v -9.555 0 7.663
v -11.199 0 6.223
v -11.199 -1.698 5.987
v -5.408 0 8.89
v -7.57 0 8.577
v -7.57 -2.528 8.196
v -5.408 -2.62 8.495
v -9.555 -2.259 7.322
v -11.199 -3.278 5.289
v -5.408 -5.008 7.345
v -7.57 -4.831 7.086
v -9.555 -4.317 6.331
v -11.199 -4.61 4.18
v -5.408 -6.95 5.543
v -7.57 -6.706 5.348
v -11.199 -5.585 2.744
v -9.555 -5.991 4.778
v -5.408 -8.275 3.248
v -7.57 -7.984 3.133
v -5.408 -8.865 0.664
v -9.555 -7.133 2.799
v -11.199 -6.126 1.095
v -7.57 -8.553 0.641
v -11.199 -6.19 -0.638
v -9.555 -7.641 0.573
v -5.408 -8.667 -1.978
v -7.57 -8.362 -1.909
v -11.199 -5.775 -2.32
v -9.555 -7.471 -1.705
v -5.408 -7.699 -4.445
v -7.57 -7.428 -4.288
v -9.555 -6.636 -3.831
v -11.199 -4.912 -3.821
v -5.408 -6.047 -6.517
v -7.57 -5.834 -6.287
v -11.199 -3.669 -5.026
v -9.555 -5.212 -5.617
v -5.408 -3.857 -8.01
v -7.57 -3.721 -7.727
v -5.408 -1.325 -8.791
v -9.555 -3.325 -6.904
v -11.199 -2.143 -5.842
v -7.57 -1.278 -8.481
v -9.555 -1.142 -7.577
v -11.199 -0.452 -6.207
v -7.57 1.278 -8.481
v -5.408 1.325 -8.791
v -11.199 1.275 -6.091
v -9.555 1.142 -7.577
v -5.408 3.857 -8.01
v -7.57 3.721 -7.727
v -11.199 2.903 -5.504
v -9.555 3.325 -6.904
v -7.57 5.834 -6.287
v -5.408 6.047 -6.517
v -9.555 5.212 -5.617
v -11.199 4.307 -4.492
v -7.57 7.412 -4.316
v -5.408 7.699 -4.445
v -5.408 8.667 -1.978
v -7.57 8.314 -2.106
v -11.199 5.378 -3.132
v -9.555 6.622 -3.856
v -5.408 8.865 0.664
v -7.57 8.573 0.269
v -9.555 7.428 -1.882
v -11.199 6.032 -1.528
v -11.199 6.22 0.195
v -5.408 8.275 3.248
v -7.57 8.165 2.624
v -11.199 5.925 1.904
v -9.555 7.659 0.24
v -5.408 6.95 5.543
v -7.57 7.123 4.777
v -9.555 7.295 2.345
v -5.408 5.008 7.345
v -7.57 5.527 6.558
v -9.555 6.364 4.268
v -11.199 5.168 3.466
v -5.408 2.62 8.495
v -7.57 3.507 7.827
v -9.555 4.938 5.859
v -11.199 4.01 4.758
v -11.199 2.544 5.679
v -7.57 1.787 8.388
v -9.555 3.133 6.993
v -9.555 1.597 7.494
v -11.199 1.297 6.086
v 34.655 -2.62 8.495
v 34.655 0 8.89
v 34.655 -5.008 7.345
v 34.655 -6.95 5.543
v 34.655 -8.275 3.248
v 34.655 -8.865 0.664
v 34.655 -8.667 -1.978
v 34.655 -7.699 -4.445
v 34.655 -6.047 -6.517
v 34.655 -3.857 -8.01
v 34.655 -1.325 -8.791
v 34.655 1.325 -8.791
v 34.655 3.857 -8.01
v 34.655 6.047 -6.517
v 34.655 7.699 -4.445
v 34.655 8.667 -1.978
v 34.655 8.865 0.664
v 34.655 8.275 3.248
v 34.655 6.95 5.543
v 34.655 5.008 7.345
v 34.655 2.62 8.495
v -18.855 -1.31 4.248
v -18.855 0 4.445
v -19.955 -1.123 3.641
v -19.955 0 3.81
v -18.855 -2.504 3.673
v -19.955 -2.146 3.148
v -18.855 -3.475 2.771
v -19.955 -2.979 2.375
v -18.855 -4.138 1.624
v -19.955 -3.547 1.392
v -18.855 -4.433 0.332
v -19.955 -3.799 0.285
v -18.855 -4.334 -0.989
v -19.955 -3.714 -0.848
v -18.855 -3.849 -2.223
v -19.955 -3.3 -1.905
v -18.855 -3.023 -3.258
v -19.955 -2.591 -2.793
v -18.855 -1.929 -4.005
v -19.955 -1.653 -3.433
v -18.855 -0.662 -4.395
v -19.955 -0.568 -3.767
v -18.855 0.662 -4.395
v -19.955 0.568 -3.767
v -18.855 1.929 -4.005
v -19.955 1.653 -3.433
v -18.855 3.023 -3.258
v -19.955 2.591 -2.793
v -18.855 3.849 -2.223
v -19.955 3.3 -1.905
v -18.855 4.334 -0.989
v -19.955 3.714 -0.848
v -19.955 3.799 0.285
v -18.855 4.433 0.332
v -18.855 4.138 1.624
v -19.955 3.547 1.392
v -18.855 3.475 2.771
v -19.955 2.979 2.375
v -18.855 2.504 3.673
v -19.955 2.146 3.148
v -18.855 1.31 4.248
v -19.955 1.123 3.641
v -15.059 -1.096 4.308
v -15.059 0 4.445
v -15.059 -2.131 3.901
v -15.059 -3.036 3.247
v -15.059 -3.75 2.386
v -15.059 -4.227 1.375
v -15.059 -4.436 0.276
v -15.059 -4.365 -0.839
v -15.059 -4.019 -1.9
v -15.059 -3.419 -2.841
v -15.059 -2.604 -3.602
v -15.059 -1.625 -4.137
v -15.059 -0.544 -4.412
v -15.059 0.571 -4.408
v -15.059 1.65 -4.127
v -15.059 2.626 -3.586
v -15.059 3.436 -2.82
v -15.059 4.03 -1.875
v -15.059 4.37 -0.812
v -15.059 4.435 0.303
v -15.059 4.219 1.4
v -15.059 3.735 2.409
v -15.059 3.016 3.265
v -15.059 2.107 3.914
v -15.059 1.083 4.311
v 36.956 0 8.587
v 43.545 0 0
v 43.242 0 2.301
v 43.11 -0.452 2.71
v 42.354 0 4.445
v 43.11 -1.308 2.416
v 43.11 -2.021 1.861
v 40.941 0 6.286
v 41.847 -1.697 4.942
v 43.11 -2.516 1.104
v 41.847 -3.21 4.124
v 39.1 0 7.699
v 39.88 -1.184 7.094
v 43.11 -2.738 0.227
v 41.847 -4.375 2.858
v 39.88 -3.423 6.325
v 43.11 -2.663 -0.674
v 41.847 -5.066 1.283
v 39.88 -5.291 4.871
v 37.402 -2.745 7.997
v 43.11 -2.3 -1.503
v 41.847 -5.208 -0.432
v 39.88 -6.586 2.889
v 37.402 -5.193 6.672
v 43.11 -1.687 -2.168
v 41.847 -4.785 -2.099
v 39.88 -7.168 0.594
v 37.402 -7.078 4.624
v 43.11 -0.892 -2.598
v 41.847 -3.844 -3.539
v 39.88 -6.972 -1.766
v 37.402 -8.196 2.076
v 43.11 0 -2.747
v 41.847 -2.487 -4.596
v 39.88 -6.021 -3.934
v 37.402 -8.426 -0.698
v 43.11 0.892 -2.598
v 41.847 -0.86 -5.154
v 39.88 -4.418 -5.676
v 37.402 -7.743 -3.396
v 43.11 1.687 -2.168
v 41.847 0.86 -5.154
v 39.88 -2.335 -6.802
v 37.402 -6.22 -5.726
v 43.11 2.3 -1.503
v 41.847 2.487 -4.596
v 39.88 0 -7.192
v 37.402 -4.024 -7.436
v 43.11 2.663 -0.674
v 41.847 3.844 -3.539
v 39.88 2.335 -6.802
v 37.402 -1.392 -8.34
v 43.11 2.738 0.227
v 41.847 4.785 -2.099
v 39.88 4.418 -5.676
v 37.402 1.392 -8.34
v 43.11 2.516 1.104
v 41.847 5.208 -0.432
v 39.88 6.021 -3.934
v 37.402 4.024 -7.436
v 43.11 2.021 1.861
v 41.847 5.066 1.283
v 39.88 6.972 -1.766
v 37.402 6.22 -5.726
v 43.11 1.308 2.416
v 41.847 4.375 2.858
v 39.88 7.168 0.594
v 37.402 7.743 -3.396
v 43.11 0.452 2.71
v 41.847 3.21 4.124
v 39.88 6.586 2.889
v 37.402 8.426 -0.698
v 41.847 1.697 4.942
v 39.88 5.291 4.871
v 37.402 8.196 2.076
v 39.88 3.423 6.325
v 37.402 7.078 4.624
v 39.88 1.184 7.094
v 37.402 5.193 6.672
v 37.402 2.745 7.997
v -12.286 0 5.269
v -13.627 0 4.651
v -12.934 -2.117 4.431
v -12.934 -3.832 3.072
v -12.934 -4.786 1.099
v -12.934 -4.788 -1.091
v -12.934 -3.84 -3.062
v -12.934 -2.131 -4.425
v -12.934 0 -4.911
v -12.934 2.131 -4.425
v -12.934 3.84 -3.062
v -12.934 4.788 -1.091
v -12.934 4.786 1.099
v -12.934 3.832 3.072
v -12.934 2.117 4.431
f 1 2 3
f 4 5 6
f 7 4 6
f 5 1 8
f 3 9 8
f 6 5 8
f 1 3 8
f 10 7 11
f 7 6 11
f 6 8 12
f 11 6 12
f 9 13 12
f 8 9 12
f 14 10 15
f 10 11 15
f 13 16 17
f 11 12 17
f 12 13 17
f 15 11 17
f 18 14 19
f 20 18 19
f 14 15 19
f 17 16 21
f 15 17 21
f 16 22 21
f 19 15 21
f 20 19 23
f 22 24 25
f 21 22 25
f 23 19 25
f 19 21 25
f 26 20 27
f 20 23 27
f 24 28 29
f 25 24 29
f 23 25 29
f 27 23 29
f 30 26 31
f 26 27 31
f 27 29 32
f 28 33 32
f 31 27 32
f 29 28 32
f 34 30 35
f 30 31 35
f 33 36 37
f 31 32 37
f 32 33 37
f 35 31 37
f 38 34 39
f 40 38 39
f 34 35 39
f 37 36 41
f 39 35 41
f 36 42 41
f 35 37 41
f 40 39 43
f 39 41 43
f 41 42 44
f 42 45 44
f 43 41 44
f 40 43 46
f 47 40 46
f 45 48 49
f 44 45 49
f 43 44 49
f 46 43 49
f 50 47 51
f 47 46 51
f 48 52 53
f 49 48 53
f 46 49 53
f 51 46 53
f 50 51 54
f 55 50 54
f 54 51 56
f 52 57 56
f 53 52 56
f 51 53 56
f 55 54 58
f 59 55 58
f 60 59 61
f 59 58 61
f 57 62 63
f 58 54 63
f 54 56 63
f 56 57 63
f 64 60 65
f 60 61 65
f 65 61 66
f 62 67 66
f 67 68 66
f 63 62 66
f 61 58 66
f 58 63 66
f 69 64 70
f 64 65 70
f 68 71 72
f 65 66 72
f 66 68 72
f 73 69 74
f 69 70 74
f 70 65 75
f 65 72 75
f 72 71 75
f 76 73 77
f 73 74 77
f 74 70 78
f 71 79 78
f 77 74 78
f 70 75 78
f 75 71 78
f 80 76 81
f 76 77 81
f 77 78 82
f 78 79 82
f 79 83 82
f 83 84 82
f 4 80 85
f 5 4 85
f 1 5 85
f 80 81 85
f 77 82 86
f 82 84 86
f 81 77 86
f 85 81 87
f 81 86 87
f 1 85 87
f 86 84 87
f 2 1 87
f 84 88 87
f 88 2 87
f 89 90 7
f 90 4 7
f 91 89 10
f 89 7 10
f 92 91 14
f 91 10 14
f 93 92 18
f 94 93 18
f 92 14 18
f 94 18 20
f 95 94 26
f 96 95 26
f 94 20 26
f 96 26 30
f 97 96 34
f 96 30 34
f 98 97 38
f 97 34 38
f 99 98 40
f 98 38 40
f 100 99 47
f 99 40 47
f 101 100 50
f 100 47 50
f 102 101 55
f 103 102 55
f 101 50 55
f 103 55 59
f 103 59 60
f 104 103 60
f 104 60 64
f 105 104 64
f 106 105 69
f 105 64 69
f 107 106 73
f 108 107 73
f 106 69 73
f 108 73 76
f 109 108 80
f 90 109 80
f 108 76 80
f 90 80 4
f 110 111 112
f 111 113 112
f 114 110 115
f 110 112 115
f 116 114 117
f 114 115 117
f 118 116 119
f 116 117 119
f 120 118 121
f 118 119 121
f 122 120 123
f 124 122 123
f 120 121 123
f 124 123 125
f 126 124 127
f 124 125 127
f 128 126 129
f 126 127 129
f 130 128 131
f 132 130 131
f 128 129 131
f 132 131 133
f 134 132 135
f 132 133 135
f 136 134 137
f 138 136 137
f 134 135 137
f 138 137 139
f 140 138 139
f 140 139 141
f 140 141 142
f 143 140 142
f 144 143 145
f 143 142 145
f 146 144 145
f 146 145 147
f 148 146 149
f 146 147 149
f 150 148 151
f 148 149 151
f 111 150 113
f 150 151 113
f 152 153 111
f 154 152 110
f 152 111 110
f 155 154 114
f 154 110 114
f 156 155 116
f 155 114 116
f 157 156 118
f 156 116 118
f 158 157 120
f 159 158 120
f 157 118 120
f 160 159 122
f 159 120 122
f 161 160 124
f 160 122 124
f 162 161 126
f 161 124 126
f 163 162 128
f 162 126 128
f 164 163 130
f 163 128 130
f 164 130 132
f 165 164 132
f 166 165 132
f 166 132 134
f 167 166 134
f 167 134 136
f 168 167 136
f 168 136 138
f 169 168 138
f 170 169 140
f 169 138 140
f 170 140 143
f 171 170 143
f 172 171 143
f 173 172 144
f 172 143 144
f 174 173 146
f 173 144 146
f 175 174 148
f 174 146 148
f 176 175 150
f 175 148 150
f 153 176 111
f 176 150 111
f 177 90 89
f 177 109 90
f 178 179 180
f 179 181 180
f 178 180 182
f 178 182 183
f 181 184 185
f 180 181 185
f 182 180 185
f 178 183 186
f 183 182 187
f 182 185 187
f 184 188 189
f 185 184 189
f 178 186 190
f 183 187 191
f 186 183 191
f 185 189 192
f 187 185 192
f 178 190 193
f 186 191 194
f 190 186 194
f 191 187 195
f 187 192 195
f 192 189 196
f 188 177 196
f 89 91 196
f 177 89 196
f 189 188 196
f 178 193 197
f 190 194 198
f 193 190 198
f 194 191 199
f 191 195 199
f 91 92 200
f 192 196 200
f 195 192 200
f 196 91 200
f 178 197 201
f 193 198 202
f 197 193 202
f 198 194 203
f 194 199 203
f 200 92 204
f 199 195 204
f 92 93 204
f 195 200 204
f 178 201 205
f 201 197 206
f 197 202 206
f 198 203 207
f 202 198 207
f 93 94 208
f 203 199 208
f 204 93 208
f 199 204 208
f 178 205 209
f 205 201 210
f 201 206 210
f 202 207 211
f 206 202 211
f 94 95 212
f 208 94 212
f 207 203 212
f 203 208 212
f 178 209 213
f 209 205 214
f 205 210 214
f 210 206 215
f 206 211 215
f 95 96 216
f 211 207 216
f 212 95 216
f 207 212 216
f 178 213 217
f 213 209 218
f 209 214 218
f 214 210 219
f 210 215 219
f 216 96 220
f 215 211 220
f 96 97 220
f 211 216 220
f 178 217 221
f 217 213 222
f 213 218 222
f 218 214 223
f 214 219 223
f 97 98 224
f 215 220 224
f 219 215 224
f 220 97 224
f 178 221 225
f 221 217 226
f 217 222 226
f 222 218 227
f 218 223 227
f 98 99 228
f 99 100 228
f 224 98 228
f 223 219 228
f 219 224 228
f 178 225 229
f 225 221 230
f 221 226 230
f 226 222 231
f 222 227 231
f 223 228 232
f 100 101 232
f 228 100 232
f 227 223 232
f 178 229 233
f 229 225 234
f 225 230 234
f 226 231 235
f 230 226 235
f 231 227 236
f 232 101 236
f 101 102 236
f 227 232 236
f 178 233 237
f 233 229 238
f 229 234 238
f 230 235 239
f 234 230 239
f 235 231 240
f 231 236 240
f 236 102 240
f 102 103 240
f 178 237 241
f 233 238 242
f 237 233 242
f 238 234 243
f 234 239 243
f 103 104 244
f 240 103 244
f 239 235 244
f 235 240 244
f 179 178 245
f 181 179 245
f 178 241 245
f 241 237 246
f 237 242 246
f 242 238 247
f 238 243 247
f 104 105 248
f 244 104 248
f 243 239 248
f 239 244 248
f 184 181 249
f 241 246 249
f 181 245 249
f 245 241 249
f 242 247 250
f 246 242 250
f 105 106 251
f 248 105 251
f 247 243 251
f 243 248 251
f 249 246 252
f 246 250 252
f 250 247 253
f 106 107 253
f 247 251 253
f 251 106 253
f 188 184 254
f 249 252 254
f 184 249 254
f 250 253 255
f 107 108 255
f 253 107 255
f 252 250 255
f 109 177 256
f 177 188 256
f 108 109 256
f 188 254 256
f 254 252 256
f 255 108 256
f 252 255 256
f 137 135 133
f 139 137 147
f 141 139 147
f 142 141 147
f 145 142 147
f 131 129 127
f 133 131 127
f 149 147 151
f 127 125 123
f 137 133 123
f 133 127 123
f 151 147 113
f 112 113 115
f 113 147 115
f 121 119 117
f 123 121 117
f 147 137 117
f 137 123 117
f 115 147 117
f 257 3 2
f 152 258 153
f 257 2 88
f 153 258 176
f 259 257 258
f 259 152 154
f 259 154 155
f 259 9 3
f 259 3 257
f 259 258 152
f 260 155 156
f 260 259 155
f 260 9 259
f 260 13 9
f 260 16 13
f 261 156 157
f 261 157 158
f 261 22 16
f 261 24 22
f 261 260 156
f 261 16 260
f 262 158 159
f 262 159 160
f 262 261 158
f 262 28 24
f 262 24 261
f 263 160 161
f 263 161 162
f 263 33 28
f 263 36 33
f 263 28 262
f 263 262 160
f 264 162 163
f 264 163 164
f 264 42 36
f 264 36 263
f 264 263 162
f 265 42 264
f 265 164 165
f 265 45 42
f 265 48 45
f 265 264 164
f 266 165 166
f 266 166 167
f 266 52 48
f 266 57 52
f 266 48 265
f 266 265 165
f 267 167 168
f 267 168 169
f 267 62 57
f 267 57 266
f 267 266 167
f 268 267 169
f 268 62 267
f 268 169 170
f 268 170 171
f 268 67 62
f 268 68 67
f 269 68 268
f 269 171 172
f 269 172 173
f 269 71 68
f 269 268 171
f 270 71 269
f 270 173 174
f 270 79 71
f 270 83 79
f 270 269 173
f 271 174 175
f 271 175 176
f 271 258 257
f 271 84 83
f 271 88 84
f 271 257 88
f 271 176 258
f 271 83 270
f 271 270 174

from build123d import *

# Parameters (mm, degrees)
F2_R = 8.89
F4_R = 5.08


# Not quite as in the source:
# - a fillet or chamfer that OpenCascade refuses, or shapes differently, is made with other operations: its cross-section is extruded or revolved along the edge and cut away or added


with BuildPart() as f1:
    # F0 (on Front) → F1 (revolve)
    with BuildSketch(Plane.XZ):
        Polygon((-19.955041249, 4.445), (-19.955041249, 0), (43.544958751, 0), (43.544958751, 8.89), (-12.335041249, 8.89), (-12.335041249, 4.445), align=None)
    revolve(axis=Axis((11.794958751, 0, 0), (1, 0, 0)))

    # F2
    f2_edges = [f1.edges().sort_by_distance(p)[0] for p in [
        (43.544959, 0, -8.89),
    ]]
    fillet(f2_edges, radius=F2_R)

    # F3: fillet of radius 7.62 on 1 edges, made by hand

    # F3_s1 → F3_t2 (revolve, cut)
    with BuildSketch(Plane.XZ):
        with BuildLine():
            ThreePointArc((-5.4080090562, 8.89), (-9.5232793997, 7.6831856359), (-12.335041249, 4.445))
            Line((-12.335041249, 4.445), (-12.335041249, 8.89))
            Line((-12.335041249, 8.89), (-5.4080090562, 8.89))
        make_face()
    revolve(axis=Axis((-12.335041249, 0, 0), (1, 0, 0)), mode=Mode.SUBTRACT)

    # F4
    f4_edges = [f1.edges().sort_by_distance(p)[0] for p in [
        (-12.335041, 0, -4.445),
    ]]
    fillet(f4_edges, radius=F4_R)

    # F5: chamfer of 0.635 x 1.0998522628 on 1 edges, made by hand

    # F5_s1 → F5_t2 (revolve, cut)
    with BuildSketch(Plane.XZ):
        Polygon((-18.8551889862, 4.445), (-19.955041249, 3.81), (-19.955041249, 4.445), align=None)
    revolve(axis=Axis((-19.955041249, 0, 0), (1, 0, 0)), mode=Mode.SUBTRACT)


solid = f1.part
